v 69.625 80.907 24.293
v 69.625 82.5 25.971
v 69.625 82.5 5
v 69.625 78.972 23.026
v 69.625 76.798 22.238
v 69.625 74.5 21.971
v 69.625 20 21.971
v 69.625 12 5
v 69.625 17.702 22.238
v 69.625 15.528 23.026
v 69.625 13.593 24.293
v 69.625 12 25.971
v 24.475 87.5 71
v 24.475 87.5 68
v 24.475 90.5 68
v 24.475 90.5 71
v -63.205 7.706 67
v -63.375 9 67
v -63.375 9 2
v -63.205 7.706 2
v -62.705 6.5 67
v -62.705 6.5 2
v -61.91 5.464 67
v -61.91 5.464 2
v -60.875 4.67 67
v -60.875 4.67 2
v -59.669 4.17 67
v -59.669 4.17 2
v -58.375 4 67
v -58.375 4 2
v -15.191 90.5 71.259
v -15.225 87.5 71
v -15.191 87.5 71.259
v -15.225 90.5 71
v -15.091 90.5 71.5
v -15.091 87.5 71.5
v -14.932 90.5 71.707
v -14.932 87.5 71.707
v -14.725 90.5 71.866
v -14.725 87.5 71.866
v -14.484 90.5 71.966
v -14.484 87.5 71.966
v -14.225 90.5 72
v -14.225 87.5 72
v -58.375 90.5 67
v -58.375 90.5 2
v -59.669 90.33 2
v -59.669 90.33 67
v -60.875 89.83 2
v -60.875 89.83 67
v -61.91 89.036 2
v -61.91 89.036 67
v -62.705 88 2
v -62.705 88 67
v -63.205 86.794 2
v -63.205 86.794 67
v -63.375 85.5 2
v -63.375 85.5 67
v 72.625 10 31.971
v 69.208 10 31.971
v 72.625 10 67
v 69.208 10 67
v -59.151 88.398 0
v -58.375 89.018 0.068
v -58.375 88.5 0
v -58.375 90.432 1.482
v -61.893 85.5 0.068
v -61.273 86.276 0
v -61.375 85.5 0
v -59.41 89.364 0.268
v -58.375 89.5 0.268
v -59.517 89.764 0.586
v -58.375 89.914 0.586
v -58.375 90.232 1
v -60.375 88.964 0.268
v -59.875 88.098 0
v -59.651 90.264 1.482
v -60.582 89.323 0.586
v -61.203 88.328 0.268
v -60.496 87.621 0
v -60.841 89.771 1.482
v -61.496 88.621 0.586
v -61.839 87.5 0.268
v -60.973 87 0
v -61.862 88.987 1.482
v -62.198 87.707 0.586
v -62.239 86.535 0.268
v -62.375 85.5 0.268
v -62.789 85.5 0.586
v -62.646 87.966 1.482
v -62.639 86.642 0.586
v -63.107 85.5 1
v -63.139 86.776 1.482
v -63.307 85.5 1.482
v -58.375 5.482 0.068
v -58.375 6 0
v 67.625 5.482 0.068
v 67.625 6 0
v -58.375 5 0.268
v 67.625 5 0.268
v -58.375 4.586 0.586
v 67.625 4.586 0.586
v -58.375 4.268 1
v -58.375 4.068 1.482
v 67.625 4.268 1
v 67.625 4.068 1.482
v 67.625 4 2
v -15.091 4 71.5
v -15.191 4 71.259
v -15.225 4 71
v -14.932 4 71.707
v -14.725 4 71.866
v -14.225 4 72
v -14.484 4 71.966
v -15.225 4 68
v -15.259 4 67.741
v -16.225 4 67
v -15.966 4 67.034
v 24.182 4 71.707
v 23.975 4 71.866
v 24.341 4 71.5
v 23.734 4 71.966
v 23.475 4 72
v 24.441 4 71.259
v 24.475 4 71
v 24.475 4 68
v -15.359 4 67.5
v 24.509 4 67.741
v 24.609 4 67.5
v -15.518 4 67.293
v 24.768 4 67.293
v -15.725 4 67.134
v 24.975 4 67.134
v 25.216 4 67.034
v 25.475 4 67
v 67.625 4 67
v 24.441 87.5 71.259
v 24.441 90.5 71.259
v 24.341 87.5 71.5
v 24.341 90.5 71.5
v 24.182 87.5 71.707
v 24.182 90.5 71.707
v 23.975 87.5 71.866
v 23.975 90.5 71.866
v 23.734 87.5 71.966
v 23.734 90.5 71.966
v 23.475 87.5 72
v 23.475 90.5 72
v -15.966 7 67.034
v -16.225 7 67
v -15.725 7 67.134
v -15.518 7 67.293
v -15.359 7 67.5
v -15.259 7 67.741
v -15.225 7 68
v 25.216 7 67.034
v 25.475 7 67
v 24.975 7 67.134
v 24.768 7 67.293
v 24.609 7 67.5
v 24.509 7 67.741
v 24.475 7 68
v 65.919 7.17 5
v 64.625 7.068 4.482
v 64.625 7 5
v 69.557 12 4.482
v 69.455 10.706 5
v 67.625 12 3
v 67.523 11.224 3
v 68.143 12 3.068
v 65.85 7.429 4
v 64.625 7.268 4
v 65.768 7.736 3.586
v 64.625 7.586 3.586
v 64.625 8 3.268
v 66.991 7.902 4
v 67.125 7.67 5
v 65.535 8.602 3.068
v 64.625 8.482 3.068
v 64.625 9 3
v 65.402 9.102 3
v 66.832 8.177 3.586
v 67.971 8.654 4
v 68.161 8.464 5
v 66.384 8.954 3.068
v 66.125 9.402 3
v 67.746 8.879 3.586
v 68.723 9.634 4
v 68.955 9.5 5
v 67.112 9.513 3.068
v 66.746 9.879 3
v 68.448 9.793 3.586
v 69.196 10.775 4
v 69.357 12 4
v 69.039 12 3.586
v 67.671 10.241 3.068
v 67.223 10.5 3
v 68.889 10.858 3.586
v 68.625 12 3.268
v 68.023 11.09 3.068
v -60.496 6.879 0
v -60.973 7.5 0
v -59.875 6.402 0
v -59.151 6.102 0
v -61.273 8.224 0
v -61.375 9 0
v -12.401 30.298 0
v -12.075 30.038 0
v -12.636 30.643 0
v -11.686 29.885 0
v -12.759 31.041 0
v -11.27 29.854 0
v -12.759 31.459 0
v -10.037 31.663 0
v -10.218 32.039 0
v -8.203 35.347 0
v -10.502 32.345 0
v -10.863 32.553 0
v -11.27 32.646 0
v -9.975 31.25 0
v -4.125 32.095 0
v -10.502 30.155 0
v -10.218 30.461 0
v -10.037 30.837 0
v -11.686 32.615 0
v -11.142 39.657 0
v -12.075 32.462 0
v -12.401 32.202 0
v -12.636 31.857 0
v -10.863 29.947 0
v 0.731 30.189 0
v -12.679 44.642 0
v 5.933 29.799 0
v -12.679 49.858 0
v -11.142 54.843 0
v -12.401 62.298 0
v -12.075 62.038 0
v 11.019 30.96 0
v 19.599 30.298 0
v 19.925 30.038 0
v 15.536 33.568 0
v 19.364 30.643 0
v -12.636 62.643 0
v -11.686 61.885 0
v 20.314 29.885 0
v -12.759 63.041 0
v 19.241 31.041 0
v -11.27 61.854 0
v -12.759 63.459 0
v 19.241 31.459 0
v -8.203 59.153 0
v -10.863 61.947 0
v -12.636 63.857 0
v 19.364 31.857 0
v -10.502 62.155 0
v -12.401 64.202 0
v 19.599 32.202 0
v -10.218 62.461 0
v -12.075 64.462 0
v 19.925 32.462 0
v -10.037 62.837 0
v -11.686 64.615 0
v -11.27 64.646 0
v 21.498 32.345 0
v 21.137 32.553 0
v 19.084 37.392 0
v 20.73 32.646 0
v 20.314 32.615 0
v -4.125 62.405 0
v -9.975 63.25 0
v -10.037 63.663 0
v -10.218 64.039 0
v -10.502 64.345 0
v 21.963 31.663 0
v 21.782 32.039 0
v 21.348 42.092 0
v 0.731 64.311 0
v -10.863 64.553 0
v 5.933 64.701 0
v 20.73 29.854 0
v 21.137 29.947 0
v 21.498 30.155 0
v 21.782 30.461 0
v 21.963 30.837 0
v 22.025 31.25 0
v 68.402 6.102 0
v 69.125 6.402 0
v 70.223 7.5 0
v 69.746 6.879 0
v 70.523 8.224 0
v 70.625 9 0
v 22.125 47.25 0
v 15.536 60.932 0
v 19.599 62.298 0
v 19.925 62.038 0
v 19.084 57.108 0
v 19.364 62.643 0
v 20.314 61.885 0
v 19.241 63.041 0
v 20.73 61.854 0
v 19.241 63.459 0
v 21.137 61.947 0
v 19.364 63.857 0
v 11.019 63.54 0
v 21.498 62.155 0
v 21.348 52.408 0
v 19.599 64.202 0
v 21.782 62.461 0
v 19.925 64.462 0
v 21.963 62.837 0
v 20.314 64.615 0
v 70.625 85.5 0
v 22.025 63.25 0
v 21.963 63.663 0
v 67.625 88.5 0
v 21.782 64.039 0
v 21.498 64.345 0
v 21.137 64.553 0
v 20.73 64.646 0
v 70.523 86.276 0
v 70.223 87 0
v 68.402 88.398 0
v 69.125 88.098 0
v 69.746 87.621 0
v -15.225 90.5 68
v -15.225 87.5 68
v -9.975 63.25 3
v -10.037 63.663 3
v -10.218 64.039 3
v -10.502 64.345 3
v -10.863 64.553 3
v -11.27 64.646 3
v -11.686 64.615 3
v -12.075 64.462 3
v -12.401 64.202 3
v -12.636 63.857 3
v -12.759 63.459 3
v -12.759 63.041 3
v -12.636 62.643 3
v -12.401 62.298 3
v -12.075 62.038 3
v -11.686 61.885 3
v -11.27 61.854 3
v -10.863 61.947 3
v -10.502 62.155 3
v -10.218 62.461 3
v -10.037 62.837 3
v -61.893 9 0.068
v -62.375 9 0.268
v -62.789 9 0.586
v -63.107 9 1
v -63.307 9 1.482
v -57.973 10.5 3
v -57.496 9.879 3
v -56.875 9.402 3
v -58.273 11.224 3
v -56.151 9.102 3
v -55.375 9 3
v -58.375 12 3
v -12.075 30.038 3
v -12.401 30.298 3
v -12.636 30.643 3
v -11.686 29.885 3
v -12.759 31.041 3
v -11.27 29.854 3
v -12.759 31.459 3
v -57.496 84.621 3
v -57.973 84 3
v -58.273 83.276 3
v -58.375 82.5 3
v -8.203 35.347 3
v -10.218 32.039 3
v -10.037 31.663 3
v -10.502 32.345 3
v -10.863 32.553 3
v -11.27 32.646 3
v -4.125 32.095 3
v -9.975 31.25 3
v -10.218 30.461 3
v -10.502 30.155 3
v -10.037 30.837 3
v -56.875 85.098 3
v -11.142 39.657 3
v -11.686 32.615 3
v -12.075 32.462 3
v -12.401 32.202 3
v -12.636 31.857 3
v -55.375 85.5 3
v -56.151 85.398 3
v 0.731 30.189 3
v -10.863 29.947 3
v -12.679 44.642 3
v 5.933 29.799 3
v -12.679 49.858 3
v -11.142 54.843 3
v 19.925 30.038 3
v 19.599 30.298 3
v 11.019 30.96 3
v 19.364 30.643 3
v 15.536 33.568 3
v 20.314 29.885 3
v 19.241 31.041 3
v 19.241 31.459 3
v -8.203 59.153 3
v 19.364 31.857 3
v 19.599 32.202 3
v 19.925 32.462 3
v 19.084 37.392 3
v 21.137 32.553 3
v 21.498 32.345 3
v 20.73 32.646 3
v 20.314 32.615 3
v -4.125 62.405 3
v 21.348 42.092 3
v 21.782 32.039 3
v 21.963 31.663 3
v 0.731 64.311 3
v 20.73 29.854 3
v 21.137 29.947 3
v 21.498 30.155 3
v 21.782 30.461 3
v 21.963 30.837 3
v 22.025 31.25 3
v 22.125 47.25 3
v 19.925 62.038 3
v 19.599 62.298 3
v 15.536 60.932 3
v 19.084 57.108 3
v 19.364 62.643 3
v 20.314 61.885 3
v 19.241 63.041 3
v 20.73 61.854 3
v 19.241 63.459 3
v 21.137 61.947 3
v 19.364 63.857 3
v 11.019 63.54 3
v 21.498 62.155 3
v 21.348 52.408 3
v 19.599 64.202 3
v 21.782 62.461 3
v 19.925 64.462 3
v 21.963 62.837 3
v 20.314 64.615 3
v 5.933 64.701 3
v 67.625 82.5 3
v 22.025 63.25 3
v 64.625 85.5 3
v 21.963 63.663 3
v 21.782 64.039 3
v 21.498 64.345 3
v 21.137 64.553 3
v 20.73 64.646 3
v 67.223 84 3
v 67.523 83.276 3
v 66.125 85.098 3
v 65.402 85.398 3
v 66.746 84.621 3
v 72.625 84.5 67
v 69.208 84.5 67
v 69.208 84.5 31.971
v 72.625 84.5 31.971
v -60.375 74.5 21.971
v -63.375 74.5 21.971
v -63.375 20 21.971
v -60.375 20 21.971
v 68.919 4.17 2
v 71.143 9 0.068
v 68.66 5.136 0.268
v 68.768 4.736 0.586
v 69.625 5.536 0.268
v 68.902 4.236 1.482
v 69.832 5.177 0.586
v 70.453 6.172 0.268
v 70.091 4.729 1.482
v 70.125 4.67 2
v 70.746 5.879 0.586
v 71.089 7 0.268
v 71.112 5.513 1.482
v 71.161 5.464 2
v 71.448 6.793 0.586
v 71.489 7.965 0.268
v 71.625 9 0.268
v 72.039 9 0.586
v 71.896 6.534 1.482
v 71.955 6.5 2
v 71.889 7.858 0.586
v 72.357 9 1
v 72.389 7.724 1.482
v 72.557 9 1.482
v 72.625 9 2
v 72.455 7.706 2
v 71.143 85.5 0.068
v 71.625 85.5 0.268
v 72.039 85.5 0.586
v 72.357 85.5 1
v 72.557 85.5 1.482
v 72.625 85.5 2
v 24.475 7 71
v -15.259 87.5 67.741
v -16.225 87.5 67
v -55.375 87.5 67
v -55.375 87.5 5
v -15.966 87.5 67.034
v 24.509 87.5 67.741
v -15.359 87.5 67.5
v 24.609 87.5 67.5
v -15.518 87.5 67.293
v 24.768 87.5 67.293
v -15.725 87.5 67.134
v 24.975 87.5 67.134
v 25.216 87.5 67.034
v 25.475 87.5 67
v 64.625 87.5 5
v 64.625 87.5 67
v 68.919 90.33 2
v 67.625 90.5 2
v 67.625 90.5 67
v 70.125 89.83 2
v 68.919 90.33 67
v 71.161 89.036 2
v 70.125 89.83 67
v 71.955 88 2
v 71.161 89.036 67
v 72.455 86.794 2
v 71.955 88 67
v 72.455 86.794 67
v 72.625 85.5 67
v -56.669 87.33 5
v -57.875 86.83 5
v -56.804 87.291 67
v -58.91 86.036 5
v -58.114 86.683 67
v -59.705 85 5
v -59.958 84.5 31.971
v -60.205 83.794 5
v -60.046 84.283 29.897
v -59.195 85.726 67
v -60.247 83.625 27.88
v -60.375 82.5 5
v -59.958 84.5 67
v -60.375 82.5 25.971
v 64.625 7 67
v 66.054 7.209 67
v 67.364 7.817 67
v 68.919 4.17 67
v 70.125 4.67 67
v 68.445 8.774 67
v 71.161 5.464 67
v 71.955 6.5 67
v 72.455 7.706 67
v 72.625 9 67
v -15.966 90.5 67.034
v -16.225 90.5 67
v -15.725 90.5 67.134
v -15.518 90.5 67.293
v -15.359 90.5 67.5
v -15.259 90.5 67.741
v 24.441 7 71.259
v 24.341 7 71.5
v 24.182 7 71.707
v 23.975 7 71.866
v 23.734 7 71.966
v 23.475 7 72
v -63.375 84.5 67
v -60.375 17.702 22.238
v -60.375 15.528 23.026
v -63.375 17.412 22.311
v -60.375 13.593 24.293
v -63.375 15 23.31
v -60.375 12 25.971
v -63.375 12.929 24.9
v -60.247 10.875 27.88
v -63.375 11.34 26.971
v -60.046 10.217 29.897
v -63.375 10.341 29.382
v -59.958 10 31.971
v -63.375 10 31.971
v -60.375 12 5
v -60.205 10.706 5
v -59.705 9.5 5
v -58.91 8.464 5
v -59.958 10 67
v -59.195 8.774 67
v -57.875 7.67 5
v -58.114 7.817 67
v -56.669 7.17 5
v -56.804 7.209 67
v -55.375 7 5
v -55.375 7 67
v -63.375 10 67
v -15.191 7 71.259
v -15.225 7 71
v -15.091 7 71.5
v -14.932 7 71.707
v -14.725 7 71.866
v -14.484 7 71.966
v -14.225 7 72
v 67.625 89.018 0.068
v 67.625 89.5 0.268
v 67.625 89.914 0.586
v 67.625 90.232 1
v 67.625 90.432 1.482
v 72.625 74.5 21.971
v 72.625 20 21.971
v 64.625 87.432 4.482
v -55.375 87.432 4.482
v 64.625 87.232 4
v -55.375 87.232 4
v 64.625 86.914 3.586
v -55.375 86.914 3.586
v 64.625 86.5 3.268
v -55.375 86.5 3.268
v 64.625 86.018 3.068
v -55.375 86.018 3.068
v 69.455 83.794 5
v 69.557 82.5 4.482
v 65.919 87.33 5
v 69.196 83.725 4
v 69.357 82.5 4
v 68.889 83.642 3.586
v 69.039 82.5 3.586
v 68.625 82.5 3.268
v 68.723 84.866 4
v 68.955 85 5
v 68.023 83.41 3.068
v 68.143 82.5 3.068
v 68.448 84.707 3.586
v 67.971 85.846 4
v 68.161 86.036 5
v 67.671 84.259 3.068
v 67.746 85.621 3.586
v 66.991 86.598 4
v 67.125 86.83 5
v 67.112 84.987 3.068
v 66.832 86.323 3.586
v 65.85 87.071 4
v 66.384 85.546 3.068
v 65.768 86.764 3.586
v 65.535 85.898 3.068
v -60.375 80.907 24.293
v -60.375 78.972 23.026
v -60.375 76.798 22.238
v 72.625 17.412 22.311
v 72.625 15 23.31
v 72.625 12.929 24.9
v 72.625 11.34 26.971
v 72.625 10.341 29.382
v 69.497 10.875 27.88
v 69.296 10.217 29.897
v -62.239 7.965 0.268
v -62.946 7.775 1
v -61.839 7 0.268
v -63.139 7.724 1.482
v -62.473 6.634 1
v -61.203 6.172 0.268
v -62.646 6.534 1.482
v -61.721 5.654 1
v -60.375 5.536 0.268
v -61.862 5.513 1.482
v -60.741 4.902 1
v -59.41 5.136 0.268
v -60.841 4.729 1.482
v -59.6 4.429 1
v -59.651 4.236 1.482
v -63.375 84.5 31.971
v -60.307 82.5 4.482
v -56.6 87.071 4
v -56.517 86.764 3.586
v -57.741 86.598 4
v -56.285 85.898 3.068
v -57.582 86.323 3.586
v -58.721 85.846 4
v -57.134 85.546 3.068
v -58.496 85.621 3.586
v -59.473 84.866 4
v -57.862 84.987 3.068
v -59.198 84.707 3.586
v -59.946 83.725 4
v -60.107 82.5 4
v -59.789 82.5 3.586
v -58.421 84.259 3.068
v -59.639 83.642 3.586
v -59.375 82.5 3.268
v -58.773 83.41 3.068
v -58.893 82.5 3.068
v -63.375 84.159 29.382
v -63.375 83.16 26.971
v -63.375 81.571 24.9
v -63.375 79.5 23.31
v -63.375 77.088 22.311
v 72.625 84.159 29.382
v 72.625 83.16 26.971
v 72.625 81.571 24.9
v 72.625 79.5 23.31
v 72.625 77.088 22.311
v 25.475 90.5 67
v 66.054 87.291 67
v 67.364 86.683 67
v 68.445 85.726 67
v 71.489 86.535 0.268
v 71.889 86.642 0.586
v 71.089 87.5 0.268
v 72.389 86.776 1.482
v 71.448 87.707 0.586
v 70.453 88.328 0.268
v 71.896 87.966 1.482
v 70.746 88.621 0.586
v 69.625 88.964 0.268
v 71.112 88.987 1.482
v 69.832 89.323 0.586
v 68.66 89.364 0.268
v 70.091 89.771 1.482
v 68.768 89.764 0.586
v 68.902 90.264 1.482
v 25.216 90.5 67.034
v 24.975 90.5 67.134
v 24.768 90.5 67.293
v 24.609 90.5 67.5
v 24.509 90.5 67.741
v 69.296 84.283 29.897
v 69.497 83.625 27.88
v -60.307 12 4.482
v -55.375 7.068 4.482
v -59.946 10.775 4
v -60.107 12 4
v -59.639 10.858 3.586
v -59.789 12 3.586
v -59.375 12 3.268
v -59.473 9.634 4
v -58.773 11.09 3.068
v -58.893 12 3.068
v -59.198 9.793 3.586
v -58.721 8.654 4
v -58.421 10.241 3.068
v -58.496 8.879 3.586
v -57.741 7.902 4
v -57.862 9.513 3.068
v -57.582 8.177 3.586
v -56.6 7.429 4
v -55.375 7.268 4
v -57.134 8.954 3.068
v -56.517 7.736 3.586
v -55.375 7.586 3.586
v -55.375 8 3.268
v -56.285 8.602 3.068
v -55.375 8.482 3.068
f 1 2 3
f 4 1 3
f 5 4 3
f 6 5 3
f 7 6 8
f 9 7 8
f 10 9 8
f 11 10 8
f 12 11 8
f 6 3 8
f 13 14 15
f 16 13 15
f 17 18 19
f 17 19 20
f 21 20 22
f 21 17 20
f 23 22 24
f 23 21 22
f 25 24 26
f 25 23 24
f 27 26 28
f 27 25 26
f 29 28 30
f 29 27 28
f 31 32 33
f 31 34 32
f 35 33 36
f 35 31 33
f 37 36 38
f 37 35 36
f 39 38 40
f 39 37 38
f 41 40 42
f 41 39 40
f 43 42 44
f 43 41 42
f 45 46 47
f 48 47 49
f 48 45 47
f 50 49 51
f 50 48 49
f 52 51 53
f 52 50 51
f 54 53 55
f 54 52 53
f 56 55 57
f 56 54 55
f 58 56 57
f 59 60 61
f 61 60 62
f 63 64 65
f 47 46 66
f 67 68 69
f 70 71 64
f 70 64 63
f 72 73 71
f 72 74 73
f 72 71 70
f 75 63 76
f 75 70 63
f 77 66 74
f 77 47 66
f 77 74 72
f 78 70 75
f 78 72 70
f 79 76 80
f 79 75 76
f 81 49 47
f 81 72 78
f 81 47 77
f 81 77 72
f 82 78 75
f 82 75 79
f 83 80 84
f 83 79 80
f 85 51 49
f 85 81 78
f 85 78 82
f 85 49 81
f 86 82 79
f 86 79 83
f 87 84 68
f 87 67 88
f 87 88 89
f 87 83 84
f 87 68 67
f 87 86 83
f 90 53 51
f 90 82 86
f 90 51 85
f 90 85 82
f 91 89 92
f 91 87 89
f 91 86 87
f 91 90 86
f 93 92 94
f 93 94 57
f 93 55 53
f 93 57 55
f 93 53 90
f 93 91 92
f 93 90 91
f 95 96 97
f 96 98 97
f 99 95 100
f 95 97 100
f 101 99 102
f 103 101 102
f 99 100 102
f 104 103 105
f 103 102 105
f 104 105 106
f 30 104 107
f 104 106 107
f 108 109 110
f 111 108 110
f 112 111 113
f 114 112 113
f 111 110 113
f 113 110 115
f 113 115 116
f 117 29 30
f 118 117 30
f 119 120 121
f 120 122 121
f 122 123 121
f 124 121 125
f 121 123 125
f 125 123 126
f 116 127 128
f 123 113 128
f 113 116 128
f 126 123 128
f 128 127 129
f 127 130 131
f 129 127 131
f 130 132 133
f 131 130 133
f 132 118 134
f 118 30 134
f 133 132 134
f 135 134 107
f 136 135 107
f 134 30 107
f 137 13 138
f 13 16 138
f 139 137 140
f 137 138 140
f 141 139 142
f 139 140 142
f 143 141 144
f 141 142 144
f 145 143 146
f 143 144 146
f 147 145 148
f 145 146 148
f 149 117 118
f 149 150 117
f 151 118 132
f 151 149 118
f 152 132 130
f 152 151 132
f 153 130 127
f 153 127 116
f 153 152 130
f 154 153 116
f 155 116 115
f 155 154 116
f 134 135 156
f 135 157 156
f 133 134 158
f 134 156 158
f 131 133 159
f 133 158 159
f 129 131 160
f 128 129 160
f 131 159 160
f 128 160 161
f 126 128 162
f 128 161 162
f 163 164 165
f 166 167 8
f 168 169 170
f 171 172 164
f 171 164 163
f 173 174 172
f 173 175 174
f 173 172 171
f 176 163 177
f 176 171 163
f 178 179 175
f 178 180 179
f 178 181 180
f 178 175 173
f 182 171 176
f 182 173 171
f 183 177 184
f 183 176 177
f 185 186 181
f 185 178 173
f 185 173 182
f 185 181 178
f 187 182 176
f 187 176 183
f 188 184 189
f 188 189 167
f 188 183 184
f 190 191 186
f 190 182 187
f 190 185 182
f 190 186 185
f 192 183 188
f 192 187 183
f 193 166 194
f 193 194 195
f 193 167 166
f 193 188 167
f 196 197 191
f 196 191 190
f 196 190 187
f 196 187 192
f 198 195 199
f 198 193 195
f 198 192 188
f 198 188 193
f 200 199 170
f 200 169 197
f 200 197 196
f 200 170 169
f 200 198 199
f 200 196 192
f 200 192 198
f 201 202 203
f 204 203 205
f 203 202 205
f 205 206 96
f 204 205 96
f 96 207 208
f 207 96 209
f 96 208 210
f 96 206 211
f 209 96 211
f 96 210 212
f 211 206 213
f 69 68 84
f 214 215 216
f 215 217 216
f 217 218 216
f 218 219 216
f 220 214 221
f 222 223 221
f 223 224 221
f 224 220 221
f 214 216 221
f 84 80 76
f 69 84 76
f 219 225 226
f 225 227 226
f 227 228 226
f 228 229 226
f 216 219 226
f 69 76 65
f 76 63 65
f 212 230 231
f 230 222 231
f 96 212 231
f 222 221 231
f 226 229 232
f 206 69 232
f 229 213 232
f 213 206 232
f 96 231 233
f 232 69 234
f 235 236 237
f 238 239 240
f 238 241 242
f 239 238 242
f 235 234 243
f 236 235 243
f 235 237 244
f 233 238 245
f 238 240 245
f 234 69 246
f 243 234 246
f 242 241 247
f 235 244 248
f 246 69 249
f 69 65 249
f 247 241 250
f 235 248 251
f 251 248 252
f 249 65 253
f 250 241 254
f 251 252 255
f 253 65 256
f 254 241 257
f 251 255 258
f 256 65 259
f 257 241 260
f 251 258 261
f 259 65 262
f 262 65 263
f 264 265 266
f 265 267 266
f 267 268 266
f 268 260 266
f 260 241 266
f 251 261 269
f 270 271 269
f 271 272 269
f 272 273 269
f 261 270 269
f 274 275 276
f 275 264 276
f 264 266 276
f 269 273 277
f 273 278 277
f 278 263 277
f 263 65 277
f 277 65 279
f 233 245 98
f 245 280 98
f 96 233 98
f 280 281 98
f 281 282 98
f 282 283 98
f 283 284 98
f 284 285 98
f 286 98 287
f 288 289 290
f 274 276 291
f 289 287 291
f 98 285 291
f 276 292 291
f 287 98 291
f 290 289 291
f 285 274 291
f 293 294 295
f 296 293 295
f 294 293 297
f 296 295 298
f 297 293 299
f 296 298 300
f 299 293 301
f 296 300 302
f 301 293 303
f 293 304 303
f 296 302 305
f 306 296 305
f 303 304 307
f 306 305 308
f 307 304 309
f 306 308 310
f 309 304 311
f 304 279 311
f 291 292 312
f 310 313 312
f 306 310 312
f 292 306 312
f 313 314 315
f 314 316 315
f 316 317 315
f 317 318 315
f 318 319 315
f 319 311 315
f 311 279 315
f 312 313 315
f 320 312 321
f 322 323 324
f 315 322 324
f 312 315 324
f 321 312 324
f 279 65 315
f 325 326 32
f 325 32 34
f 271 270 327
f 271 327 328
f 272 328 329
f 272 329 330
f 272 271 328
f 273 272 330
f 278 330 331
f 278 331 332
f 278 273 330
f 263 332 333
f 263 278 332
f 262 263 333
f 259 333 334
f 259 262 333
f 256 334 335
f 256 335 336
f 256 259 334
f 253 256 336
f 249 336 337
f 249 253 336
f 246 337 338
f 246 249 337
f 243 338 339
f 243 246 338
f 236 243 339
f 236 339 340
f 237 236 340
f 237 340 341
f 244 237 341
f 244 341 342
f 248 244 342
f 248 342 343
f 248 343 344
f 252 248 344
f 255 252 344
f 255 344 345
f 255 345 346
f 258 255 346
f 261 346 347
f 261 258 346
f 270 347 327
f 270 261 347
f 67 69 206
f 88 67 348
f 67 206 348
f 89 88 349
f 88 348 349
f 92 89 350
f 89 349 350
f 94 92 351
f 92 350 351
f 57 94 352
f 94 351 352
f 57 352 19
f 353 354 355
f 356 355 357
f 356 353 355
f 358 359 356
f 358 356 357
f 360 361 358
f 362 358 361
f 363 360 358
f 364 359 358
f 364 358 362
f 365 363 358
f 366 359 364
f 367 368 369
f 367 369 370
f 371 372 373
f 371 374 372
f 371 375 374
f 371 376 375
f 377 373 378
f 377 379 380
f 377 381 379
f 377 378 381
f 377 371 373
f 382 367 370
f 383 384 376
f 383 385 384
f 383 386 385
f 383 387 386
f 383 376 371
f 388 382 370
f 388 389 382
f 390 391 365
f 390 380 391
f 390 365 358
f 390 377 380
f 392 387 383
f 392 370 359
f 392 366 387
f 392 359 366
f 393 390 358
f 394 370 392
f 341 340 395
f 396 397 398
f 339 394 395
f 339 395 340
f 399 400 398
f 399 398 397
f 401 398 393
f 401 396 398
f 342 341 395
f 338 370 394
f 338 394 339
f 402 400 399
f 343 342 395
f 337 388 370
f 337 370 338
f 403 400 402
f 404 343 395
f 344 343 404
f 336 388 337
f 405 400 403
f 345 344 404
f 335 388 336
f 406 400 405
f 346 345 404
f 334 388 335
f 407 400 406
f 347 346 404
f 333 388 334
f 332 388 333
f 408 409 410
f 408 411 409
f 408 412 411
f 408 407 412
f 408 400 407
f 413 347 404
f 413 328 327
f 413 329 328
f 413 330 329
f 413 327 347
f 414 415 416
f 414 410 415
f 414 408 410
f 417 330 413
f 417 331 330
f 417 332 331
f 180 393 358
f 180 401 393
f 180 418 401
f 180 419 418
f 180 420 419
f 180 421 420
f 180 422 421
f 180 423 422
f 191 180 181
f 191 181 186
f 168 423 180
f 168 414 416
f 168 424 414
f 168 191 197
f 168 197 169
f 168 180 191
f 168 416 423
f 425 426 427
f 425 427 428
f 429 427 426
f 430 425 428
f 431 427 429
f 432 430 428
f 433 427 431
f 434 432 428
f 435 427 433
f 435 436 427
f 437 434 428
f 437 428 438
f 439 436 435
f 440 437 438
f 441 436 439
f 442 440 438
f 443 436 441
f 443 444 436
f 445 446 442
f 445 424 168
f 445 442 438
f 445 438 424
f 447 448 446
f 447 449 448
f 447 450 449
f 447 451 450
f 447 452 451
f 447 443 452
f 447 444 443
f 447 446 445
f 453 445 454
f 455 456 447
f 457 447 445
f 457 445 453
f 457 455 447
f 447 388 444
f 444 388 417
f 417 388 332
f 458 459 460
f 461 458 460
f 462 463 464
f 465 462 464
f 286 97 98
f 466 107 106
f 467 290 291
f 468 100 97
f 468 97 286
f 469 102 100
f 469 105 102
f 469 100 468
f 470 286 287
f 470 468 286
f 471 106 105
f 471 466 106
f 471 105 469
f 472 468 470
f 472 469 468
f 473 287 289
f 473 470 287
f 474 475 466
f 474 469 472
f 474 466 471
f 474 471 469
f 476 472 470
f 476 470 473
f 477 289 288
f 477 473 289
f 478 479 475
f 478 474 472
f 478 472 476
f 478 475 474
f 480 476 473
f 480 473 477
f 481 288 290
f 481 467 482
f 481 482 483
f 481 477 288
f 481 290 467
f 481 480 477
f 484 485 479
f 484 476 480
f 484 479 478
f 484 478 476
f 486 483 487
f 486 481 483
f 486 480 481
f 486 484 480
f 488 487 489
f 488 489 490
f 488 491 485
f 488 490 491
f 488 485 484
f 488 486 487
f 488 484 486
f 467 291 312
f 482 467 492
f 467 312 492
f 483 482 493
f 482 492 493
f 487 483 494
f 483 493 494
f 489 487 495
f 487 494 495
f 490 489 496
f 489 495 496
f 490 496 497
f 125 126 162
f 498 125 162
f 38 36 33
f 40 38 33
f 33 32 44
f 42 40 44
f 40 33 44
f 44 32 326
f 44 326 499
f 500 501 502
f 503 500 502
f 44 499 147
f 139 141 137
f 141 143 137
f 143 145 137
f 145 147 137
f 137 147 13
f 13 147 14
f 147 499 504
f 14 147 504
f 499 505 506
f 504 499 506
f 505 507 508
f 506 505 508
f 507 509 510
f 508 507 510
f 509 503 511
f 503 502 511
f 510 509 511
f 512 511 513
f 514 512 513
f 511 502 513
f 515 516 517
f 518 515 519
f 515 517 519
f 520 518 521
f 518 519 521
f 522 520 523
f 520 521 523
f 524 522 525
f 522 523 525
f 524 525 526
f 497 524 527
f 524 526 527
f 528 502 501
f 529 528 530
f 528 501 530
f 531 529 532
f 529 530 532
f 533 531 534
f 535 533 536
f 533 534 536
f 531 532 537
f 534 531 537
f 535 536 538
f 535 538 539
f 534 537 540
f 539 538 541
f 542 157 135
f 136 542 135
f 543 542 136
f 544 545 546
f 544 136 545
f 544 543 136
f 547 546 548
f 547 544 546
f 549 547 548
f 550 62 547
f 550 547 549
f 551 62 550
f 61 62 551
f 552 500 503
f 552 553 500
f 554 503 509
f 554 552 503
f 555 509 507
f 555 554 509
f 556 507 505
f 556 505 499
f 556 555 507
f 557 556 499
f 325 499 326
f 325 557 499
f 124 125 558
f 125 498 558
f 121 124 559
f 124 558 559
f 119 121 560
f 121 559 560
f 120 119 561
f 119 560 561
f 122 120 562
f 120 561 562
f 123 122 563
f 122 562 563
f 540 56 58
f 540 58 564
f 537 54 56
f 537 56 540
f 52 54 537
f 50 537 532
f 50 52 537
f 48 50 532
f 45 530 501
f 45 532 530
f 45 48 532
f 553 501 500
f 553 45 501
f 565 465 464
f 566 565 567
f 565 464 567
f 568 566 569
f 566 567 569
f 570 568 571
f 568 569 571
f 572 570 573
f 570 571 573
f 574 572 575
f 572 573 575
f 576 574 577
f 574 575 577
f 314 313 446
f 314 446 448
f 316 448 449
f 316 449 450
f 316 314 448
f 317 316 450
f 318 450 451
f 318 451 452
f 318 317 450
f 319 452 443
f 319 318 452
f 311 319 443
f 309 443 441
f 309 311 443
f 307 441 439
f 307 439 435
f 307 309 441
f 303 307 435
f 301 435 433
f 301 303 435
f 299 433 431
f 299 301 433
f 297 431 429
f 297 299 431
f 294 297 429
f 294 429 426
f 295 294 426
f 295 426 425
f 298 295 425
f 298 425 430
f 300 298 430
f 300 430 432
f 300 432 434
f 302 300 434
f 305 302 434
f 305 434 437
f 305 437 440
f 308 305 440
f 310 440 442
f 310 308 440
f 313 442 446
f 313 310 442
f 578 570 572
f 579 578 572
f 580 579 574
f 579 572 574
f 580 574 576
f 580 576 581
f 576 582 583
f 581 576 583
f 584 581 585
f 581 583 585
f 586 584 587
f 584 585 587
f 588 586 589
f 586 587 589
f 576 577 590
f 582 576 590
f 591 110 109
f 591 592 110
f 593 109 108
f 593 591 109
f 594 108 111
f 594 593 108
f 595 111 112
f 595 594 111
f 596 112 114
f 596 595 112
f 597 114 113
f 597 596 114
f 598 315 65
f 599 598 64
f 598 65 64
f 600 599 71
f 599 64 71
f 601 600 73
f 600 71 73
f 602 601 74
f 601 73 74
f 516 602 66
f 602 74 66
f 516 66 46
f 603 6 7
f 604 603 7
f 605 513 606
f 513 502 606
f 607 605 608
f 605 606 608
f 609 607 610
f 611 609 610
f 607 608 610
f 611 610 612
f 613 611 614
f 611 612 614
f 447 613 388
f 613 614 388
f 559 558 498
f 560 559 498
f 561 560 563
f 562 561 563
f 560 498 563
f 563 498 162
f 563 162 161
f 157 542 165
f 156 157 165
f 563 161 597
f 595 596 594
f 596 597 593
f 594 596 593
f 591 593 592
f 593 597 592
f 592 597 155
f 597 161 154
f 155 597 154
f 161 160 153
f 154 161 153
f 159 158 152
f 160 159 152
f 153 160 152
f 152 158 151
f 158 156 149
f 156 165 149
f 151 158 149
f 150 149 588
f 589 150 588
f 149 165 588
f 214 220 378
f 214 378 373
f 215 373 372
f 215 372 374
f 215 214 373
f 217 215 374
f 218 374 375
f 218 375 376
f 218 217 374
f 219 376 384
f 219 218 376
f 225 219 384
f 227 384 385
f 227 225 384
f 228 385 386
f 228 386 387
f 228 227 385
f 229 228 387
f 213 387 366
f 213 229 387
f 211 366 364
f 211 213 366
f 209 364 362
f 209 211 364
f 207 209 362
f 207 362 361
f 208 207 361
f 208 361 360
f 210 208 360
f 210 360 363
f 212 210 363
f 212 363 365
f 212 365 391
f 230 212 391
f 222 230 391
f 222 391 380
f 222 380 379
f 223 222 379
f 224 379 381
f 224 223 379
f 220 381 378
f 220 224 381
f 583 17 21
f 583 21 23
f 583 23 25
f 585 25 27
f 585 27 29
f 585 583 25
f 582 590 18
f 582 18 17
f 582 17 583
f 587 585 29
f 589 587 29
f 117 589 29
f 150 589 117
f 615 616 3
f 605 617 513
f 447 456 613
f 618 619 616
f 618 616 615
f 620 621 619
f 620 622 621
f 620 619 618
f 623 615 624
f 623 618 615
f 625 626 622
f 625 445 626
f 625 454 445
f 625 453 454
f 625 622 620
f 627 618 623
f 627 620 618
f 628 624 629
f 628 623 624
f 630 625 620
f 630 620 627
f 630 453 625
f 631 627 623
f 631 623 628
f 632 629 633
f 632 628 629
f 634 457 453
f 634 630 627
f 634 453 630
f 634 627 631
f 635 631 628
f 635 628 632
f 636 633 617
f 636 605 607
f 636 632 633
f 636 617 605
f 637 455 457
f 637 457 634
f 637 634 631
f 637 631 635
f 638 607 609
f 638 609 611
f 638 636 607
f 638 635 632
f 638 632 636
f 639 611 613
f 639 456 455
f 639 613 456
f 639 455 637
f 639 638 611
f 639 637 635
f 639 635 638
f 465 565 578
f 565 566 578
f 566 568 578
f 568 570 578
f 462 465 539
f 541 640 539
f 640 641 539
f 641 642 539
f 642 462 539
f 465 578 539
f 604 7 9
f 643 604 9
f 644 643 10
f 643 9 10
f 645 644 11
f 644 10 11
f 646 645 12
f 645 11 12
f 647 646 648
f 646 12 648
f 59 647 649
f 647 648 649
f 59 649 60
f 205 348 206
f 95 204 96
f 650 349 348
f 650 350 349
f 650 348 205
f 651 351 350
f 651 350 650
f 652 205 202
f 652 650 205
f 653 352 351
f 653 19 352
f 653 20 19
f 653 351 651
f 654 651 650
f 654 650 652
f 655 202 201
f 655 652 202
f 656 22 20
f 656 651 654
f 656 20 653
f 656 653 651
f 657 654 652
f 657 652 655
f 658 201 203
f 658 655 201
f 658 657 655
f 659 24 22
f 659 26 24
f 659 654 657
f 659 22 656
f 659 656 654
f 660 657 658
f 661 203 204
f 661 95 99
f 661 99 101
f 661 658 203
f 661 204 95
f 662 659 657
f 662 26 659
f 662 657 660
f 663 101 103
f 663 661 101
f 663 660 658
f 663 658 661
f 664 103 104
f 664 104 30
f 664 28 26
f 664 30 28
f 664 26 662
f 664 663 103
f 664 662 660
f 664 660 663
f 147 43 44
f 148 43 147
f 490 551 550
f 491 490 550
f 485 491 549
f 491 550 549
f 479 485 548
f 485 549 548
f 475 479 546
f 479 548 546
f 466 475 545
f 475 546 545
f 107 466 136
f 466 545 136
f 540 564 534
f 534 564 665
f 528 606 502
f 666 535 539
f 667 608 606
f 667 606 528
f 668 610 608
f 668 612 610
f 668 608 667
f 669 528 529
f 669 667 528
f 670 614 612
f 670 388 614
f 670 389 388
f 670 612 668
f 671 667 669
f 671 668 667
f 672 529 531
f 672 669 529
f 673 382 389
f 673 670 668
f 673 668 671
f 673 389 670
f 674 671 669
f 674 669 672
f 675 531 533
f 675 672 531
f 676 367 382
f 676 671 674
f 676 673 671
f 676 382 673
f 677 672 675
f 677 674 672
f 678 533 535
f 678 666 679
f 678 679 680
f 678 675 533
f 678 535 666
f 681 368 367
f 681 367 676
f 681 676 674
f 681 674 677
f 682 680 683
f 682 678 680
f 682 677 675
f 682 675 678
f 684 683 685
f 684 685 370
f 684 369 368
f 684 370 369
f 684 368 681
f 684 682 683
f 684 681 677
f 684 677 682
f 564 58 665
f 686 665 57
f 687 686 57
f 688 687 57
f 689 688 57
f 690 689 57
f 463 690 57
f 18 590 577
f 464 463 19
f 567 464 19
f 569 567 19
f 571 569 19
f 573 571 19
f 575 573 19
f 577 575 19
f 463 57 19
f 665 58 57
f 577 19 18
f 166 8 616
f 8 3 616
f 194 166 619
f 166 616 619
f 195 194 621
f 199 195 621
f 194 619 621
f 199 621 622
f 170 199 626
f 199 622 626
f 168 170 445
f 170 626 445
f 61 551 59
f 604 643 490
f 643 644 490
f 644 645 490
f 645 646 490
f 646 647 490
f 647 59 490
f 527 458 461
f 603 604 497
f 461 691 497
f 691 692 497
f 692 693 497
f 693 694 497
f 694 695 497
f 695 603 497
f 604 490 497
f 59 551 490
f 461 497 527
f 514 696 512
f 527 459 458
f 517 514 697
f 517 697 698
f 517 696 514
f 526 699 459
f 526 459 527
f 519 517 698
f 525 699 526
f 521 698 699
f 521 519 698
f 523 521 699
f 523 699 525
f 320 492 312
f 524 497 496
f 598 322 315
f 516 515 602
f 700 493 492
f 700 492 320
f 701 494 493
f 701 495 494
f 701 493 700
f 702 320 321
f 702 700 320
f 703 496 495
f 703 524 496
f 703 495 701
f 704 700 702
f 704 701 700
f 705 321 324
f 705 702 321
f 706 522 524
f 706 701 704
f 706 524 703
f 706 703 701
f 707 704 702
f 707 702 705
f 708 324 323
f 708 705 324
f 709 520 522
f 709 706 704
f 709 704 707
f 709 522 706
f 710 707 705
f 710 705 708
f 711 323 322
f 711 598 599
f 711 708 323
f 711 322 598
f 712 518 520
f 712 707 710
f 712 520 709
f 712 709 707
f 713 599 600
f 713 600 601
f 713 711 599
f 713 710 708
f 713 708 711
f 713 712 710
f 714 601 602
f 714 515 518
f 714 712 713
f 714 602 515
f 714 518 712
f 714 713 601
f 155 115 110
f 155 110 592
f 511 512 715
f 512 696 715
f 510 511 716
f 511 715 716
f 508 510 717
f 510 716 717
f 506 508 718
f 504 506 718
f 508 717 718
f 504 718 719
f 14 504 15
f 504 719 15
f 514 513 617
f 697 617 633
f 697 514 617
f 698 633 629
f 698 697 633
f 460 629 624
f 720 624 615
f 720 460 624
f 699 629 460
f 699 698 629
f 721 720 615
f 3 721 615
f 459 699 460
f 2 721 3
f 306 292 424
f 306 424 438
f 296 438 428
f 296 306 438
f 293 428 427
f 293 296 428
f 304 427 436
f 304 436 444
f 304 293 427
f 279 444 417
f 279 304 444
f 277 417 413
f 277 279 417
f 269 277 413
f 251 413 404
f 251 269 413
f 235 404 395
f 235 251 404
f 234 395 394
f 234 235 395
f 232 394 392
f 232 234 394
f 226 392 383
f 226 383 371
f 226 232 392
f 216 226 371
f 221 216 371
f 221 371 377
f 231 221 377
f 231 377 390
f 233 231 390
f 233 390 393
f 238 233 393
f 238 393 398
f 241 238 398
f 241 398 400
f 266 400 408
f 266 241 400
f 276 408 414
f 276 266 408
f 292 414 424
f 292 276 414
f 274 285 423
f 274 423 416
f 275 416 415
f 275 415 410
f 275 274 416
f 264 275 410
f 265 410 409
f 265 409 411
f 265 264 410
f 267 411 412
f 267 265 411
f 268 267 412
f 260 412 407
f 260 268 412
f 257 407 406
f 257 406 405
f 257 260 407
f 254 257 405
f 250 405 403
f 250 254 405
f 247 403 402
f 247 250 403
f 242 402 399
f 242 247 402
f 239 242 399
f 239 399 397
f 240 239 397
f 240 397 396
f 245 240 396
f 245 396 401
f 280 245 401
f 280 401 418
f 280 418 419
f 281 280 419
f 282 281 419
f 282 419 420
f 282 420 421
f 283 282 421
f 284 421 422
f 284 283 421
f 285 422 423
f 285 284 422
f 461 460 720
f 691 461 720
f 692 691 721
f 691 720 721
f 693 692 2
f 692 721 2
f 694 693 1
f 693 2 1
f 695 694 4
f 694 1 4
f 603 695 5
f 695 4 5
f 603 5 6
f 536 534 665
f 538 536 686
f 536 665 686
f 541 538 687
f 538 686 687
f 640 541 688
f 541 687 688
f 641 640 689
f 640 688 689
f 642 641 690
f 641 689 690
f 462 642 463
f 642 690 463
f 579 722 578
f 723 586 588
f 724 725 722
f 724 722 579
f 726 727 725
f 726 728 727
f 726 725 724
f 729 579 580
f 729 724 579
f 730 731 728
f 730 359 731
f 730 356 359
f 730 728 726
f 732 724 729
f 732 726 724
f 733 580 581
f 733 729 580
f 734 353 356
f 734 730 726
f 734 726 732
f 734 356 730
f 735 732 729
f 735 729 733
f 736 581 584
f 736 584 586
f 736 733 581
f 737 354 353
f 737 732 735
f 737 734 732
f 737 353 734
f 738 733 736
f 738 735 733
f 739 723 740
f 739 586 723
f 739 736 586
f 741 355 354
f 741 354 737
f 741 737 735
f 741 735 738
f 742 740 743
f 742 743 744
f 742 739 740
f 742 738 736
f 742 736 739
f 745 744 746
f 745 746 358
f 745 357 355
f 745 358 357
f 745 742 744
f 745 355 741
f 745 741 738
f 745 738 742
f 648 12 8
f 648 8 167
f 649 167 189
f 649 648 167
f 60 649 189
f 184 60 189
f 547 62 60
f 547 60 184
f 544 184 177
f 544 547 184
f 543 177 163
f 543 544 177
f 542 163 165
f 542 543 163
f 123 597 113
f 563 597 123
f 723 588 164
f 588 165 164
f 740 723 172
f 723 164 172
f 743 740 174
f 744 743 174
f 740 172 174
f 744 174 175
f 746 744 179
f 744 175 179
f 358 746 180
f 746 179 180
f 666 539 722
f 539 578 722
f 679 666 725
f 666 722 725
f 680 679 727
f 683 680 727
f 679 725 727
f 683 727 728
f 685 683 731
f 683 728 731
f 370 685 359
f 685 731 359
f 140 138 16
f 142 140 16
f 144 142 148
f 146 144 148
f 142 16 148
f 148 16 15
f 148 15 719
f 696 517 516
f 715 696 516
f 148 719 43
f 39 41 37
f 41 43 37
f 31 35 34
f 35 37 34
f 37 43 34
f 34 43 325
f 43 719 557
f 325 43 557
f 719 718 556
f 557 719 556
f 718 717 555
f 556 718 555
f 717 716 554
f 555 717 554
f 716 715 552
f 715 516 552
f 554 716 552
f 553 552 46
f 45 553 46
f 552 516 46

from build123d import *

# Parameters (mm, degrees)
F0_R     = 3
F0_R_2   = 1.4
F0_R_3   = 17.5
F0_R_4   = 1.5
F1_DEPTH = 3
F0_W     = 65
F0_H     = 3
F2_DEPTH = 67
F4_DEPTH = 136.001
F5_W     = 39.7
F5_H     = 3
F6_W     = 39.7
F6_H     = 3
F7_DEPTH = 5
F8_R     = 1
F9_R     = 5
F10_R    = 2


# Not quite as in the source:
# - a feature names something its author has since deleted; it is built from what else it names


with BuildPart() as f1:
    # F0 (on Top) → F1 (new body)
    with BuildSketch(Plane.XY):
        Polygon((-60.3749420391, 27.6098903269), (-60.3749420391, 7), (-15.3749420391, 7), (-15.3749420391, 12), (24.6250579609, 12), (24.6250579609, 7), (69.6250579609, 7), (69.6250579609, 53.4099719524), (69.6250579609, 87.5), (4.6250579609, 87.5), (-60.3749420391, 87.5), (-60.3749420391, 71.25), align=None)
        with Locations((-30.3749420391, 23.25)):
            Circle(F0_R, mode=Mode.SUBTRACT)
        with Locations((-11.3749420391, 31.25)):
            Circle(F0_R_2, mode=Mode.SUBTRACT)
        with Locations((20.6250579609, 31.25)):
            Circle(F0_R_2, mode=Mode.SUBTRACT)
        with Locations((52.6250579609, 23.25)):
            Circle(F0_R, mode=Mode.SUBTRACT)
        with Locations((-11.3749420391, 63.25)):
            Circle(F0_R_2, mode=Mode.SUBTRACT)
        with BuildLine():
            ThreePointArc((-27.3749420391, 71.25), (-30.3749420391, 68.25), (-33.3749420391, 71.25))
            ThreePointArc((-33.3749420391, 71.25), (-30.3749420391, 74.25), (-27.3749420391, 71.25))
        make_face(mode=Mode.SUBTRACT)
        with Locations((4.6250579609, 47.25)):
            Circle(F0_R_3, mode=Mode.SUBTRACT)
        with Locations((20.6250579609, 63.25)):
            Circle(F0_R_2, mode=Mode.SUBTRACT)
        with Locations((52.6250579609, 71.25)):
            Circle(F0_R, mode=Mode.SUBTRACT)
        Polygon((-15.3749420391, 12), (-15.3749420391, 7), (14.8769766092, 7), (24.6250579609, 7), (24.6250579609, 12), align=None)
        with BuildLine():
            ThreePointArc((-27.3749420391, 71.25), (-30.3749420391, 74.25), (-33.3749420391, 71.25))
            ThreePointArc((-33.3749420391, 71.25), (-30.3749420391, 68.25), (-27.3749420391, 71.25))
        make_face()
        with BuildLine():
            ThreePointArc((-28.8749420391, 71.25), (-30.3749420391, 69.75), (-31.8749420391, 71.25))
            ThreePointArc((-31.8749420391, 71.25), (-30.3749420391, 72.75), (-28.8749420391, 71.25))
        make_face(mode=Mode.SUBTRACT)
        with BuildLine():
            ThreePointArc((-28.8749420391, 71.25), (-30.3749420391, 72.75), (-31.8749420391, 71.25))
            ThreePointArc((-31.8749420391, 71.25), (-30.3749420391, 69.75), (-28.8749420391, 71.25))
        make_face()
        with Locations((52.6250579609, 71.25)):
            Circle(F0_R)
        with Locations((52.6250579609, 71.25)):
            Circle(F0_R_4, mode=Mode.SUBTRACT)
        with Locations((52.6250579609, 71.25)):
            Circle(F0_R_4)
        with Locations((52.6250579609, 23.25)):
            Circle(F0_R)
        with Locations((52.6250579609, 23.25)):
            Circle(F0_R_4, mode=Mode.SUBTRACT)
        with Locations((52.6250579609, 23.25)):
            Circle(F0_R_4)
        with Locations((-30.3749420391, 23.25)):
            Circle(F0_R)
        with Locations((-30.3749420391, 23.25)):
            Circle(F0_R_4, mode=Mode.SUBTRACT)
        with Locations((-30.3749420391, 23.25)):
            Circle(F0_R_4)
    extrude(amount=F1_DEPTH)

    # F0 (on Top) → F2 (join)
    with BuildSketch(Plane.XY):
        Polygon((-63.3749420391, 27.6098903269), (-60.3749420391, 27.6098903269), (-60.3749420391, 71.25), (-60.3749420391, 87.5), (-60.3749420391, 90.5), (-63.3749420391, 90.5), align=None)
        with Locations((-27.8749420391, 89)):
            Rectangle(F0_W, F0_H)
        with Locations((37.1250579609, 89)):
            Rectangle(F0_W, F0_H)
        Polygon((69.6250579609, 87.5), (69.6250579609, 53.4099719524), (72.6250579609, 53.4099719524), (72.6250579609, 90.5), (69.6250579609, 90.5), align=None)
        Polygon((69.6250579609, 7), (69.6250579609, 4), (72.6250579609, 4), (72.6250579609, 53.4099719524), (69.6250579609, 53.4099719524), align=None)
        Polygon((14.8769766092, 4), (69.6250579609, 4), (69.6250579609, 7), (24.6250579609, 7), (14.8769766092, 7), align=None)
        Polygon((-60.3749420391, 7), (-60.3749420391, 4), (14.8769766092, 4), (14.8769766092, 7), (-15.3749420391, 7), align=None)
        Polygon((-63.3749420391, 4), (-60.3749420391, 4), (-60.3749420391, 7), (-60.3749420391, 27.6098903269), (-63.3749420391, 27.6098903269), align=None)
    extrude(amount=F2_DEPTH)

    # F3 (on face) → F4 (cut, through all)
    with BuildSketch(Plane(origin=(-63.3749420391, 0, 0), x_dir=(0, -1, 0), z_dir=(-1, 0, 0))):
        with BuildLine():
            ThreePointArc((-20, 21.9706685841), (-12.9289321881, 24.8996007722), (-10, 31.9706685841))
            ThreePointArc((-10, 31.9706685841), (-20, 41.9706685841), (-30, 31.9706685841))
            ThreePointArc((-30, 31.9706685841), (-27.0710678119, 24.8996007722), (-20, 21.9706685841))
        make_face()
        with BuildLine():
            ThreePointArc((-30, 31.9706685841), (-20, 41.9706685841), (-10, 31.9706685841))
            Line((-10, 31.9706685841), (-10, 67))
            Line((-10, 67), (-30, 67))
            Line((-30, 67), (-30, 31.9706685841))
        make_face()
        with BuildLine():
            ThreePointArc((-74.5, 21.9706685841), (-67.4289321881, 24.8996007722), (-64.5, 31.9706685841))
            ThreePointArc((-64.5, 31.9706685841), (-74.5, 41.9706685841), (-84.5, 31.9706685841))
            ThreePointArc((-84.5, 31.9706685841), (-81.5710678119, 24.8996007722), (-74.5, 21.9706685841))
        make_face()
        with BuildLine():
            Line((-64.5, 31.9706685841), (-30, 31.9706685841))
            Line((-30, 31.9706685841), (-30, 67))
            Line((-30, 67), (-84.5, 67))
            Line((-84.5, 67), (-84.5, 31.9706685841))
            ThreePointArc((-84.5, 31.9706685841), (-74.5, 41.9706685841), (-64.5, 31.9706685841))
        make_face()
        with BuildLine():
            ThreePointArc((-20, 21.9706685841), (-27.0710678119, 24.8996007722), (-30, 31.9706685841))
            Line((-30, 31.9706685841), (-64.5, 31.9706685841))
            ThreePointArc((-64.5, 31.9706685841), (-67.4289321881, 24.8996007722), (-74.5, 21.9706685841))
            Line((-74.5, 21.9706685841), (-20, 21.9706685841))
        make_face()
    extrude(amount=-F4_DEPTH, mode=Mode.SUBTRACT)

    # F5 (on face) + F6 (on face) → F7 (join)
    with BuildSketch(Plane.XY.offset(67)):
        with Locations((4.6250579609, 5.5)):
            Rectangle(F5_W, F5_H)
    with BuildSketch(Plane.XY.offset(67)):
        with Locations((4.6250579609, 89)):
            Rectangle(F6_W, F6_H)
    extrude(amount=F7_DEPTH)

    # F8
    f8_edges = [f1.edges().sort_by_distance(p)[0] for p in [
        (-15.224942, 5.5, 67),
        (-15.224942, 5.5, 72),
        (24.475058, 5.5, 72),
        (24.475058, 5.5, 67),
        (-15.224942, 89, 67),
        (-15.224942, 89, 72),
        (24.475058, 89, 72),
        (24.475058, 89, 67),
    ]]
    fillet(f8_edges, radius=F8_R)

    # F9
    f9_edges = [f1.edges().sort_by_distance(p)[0] for p in [
        (72.625058, 4, 33.5),
        (72.625058, 90.5, 33.5),
        (-63.374942, 90.5, 33.5),
        (-63.374942, 4, 33.5),
        (-60.374942, 7, 35),
        (-60.374942, 87.5, 35),
        (69.625058, 87.5, 35),
        (69.625058, 7, 35),
    ]]
    fillet(f9_edges, radius=F9_R)

    # F10
    f10_edges = [f1.edges().sort_by_distance(p)[0] for p in [
        (4.625058, 87.5, 3),
        (4.625058, 4, 0),
    ]]
    fillet(f10_edges, radius=F10_R)


solid = f1.part
